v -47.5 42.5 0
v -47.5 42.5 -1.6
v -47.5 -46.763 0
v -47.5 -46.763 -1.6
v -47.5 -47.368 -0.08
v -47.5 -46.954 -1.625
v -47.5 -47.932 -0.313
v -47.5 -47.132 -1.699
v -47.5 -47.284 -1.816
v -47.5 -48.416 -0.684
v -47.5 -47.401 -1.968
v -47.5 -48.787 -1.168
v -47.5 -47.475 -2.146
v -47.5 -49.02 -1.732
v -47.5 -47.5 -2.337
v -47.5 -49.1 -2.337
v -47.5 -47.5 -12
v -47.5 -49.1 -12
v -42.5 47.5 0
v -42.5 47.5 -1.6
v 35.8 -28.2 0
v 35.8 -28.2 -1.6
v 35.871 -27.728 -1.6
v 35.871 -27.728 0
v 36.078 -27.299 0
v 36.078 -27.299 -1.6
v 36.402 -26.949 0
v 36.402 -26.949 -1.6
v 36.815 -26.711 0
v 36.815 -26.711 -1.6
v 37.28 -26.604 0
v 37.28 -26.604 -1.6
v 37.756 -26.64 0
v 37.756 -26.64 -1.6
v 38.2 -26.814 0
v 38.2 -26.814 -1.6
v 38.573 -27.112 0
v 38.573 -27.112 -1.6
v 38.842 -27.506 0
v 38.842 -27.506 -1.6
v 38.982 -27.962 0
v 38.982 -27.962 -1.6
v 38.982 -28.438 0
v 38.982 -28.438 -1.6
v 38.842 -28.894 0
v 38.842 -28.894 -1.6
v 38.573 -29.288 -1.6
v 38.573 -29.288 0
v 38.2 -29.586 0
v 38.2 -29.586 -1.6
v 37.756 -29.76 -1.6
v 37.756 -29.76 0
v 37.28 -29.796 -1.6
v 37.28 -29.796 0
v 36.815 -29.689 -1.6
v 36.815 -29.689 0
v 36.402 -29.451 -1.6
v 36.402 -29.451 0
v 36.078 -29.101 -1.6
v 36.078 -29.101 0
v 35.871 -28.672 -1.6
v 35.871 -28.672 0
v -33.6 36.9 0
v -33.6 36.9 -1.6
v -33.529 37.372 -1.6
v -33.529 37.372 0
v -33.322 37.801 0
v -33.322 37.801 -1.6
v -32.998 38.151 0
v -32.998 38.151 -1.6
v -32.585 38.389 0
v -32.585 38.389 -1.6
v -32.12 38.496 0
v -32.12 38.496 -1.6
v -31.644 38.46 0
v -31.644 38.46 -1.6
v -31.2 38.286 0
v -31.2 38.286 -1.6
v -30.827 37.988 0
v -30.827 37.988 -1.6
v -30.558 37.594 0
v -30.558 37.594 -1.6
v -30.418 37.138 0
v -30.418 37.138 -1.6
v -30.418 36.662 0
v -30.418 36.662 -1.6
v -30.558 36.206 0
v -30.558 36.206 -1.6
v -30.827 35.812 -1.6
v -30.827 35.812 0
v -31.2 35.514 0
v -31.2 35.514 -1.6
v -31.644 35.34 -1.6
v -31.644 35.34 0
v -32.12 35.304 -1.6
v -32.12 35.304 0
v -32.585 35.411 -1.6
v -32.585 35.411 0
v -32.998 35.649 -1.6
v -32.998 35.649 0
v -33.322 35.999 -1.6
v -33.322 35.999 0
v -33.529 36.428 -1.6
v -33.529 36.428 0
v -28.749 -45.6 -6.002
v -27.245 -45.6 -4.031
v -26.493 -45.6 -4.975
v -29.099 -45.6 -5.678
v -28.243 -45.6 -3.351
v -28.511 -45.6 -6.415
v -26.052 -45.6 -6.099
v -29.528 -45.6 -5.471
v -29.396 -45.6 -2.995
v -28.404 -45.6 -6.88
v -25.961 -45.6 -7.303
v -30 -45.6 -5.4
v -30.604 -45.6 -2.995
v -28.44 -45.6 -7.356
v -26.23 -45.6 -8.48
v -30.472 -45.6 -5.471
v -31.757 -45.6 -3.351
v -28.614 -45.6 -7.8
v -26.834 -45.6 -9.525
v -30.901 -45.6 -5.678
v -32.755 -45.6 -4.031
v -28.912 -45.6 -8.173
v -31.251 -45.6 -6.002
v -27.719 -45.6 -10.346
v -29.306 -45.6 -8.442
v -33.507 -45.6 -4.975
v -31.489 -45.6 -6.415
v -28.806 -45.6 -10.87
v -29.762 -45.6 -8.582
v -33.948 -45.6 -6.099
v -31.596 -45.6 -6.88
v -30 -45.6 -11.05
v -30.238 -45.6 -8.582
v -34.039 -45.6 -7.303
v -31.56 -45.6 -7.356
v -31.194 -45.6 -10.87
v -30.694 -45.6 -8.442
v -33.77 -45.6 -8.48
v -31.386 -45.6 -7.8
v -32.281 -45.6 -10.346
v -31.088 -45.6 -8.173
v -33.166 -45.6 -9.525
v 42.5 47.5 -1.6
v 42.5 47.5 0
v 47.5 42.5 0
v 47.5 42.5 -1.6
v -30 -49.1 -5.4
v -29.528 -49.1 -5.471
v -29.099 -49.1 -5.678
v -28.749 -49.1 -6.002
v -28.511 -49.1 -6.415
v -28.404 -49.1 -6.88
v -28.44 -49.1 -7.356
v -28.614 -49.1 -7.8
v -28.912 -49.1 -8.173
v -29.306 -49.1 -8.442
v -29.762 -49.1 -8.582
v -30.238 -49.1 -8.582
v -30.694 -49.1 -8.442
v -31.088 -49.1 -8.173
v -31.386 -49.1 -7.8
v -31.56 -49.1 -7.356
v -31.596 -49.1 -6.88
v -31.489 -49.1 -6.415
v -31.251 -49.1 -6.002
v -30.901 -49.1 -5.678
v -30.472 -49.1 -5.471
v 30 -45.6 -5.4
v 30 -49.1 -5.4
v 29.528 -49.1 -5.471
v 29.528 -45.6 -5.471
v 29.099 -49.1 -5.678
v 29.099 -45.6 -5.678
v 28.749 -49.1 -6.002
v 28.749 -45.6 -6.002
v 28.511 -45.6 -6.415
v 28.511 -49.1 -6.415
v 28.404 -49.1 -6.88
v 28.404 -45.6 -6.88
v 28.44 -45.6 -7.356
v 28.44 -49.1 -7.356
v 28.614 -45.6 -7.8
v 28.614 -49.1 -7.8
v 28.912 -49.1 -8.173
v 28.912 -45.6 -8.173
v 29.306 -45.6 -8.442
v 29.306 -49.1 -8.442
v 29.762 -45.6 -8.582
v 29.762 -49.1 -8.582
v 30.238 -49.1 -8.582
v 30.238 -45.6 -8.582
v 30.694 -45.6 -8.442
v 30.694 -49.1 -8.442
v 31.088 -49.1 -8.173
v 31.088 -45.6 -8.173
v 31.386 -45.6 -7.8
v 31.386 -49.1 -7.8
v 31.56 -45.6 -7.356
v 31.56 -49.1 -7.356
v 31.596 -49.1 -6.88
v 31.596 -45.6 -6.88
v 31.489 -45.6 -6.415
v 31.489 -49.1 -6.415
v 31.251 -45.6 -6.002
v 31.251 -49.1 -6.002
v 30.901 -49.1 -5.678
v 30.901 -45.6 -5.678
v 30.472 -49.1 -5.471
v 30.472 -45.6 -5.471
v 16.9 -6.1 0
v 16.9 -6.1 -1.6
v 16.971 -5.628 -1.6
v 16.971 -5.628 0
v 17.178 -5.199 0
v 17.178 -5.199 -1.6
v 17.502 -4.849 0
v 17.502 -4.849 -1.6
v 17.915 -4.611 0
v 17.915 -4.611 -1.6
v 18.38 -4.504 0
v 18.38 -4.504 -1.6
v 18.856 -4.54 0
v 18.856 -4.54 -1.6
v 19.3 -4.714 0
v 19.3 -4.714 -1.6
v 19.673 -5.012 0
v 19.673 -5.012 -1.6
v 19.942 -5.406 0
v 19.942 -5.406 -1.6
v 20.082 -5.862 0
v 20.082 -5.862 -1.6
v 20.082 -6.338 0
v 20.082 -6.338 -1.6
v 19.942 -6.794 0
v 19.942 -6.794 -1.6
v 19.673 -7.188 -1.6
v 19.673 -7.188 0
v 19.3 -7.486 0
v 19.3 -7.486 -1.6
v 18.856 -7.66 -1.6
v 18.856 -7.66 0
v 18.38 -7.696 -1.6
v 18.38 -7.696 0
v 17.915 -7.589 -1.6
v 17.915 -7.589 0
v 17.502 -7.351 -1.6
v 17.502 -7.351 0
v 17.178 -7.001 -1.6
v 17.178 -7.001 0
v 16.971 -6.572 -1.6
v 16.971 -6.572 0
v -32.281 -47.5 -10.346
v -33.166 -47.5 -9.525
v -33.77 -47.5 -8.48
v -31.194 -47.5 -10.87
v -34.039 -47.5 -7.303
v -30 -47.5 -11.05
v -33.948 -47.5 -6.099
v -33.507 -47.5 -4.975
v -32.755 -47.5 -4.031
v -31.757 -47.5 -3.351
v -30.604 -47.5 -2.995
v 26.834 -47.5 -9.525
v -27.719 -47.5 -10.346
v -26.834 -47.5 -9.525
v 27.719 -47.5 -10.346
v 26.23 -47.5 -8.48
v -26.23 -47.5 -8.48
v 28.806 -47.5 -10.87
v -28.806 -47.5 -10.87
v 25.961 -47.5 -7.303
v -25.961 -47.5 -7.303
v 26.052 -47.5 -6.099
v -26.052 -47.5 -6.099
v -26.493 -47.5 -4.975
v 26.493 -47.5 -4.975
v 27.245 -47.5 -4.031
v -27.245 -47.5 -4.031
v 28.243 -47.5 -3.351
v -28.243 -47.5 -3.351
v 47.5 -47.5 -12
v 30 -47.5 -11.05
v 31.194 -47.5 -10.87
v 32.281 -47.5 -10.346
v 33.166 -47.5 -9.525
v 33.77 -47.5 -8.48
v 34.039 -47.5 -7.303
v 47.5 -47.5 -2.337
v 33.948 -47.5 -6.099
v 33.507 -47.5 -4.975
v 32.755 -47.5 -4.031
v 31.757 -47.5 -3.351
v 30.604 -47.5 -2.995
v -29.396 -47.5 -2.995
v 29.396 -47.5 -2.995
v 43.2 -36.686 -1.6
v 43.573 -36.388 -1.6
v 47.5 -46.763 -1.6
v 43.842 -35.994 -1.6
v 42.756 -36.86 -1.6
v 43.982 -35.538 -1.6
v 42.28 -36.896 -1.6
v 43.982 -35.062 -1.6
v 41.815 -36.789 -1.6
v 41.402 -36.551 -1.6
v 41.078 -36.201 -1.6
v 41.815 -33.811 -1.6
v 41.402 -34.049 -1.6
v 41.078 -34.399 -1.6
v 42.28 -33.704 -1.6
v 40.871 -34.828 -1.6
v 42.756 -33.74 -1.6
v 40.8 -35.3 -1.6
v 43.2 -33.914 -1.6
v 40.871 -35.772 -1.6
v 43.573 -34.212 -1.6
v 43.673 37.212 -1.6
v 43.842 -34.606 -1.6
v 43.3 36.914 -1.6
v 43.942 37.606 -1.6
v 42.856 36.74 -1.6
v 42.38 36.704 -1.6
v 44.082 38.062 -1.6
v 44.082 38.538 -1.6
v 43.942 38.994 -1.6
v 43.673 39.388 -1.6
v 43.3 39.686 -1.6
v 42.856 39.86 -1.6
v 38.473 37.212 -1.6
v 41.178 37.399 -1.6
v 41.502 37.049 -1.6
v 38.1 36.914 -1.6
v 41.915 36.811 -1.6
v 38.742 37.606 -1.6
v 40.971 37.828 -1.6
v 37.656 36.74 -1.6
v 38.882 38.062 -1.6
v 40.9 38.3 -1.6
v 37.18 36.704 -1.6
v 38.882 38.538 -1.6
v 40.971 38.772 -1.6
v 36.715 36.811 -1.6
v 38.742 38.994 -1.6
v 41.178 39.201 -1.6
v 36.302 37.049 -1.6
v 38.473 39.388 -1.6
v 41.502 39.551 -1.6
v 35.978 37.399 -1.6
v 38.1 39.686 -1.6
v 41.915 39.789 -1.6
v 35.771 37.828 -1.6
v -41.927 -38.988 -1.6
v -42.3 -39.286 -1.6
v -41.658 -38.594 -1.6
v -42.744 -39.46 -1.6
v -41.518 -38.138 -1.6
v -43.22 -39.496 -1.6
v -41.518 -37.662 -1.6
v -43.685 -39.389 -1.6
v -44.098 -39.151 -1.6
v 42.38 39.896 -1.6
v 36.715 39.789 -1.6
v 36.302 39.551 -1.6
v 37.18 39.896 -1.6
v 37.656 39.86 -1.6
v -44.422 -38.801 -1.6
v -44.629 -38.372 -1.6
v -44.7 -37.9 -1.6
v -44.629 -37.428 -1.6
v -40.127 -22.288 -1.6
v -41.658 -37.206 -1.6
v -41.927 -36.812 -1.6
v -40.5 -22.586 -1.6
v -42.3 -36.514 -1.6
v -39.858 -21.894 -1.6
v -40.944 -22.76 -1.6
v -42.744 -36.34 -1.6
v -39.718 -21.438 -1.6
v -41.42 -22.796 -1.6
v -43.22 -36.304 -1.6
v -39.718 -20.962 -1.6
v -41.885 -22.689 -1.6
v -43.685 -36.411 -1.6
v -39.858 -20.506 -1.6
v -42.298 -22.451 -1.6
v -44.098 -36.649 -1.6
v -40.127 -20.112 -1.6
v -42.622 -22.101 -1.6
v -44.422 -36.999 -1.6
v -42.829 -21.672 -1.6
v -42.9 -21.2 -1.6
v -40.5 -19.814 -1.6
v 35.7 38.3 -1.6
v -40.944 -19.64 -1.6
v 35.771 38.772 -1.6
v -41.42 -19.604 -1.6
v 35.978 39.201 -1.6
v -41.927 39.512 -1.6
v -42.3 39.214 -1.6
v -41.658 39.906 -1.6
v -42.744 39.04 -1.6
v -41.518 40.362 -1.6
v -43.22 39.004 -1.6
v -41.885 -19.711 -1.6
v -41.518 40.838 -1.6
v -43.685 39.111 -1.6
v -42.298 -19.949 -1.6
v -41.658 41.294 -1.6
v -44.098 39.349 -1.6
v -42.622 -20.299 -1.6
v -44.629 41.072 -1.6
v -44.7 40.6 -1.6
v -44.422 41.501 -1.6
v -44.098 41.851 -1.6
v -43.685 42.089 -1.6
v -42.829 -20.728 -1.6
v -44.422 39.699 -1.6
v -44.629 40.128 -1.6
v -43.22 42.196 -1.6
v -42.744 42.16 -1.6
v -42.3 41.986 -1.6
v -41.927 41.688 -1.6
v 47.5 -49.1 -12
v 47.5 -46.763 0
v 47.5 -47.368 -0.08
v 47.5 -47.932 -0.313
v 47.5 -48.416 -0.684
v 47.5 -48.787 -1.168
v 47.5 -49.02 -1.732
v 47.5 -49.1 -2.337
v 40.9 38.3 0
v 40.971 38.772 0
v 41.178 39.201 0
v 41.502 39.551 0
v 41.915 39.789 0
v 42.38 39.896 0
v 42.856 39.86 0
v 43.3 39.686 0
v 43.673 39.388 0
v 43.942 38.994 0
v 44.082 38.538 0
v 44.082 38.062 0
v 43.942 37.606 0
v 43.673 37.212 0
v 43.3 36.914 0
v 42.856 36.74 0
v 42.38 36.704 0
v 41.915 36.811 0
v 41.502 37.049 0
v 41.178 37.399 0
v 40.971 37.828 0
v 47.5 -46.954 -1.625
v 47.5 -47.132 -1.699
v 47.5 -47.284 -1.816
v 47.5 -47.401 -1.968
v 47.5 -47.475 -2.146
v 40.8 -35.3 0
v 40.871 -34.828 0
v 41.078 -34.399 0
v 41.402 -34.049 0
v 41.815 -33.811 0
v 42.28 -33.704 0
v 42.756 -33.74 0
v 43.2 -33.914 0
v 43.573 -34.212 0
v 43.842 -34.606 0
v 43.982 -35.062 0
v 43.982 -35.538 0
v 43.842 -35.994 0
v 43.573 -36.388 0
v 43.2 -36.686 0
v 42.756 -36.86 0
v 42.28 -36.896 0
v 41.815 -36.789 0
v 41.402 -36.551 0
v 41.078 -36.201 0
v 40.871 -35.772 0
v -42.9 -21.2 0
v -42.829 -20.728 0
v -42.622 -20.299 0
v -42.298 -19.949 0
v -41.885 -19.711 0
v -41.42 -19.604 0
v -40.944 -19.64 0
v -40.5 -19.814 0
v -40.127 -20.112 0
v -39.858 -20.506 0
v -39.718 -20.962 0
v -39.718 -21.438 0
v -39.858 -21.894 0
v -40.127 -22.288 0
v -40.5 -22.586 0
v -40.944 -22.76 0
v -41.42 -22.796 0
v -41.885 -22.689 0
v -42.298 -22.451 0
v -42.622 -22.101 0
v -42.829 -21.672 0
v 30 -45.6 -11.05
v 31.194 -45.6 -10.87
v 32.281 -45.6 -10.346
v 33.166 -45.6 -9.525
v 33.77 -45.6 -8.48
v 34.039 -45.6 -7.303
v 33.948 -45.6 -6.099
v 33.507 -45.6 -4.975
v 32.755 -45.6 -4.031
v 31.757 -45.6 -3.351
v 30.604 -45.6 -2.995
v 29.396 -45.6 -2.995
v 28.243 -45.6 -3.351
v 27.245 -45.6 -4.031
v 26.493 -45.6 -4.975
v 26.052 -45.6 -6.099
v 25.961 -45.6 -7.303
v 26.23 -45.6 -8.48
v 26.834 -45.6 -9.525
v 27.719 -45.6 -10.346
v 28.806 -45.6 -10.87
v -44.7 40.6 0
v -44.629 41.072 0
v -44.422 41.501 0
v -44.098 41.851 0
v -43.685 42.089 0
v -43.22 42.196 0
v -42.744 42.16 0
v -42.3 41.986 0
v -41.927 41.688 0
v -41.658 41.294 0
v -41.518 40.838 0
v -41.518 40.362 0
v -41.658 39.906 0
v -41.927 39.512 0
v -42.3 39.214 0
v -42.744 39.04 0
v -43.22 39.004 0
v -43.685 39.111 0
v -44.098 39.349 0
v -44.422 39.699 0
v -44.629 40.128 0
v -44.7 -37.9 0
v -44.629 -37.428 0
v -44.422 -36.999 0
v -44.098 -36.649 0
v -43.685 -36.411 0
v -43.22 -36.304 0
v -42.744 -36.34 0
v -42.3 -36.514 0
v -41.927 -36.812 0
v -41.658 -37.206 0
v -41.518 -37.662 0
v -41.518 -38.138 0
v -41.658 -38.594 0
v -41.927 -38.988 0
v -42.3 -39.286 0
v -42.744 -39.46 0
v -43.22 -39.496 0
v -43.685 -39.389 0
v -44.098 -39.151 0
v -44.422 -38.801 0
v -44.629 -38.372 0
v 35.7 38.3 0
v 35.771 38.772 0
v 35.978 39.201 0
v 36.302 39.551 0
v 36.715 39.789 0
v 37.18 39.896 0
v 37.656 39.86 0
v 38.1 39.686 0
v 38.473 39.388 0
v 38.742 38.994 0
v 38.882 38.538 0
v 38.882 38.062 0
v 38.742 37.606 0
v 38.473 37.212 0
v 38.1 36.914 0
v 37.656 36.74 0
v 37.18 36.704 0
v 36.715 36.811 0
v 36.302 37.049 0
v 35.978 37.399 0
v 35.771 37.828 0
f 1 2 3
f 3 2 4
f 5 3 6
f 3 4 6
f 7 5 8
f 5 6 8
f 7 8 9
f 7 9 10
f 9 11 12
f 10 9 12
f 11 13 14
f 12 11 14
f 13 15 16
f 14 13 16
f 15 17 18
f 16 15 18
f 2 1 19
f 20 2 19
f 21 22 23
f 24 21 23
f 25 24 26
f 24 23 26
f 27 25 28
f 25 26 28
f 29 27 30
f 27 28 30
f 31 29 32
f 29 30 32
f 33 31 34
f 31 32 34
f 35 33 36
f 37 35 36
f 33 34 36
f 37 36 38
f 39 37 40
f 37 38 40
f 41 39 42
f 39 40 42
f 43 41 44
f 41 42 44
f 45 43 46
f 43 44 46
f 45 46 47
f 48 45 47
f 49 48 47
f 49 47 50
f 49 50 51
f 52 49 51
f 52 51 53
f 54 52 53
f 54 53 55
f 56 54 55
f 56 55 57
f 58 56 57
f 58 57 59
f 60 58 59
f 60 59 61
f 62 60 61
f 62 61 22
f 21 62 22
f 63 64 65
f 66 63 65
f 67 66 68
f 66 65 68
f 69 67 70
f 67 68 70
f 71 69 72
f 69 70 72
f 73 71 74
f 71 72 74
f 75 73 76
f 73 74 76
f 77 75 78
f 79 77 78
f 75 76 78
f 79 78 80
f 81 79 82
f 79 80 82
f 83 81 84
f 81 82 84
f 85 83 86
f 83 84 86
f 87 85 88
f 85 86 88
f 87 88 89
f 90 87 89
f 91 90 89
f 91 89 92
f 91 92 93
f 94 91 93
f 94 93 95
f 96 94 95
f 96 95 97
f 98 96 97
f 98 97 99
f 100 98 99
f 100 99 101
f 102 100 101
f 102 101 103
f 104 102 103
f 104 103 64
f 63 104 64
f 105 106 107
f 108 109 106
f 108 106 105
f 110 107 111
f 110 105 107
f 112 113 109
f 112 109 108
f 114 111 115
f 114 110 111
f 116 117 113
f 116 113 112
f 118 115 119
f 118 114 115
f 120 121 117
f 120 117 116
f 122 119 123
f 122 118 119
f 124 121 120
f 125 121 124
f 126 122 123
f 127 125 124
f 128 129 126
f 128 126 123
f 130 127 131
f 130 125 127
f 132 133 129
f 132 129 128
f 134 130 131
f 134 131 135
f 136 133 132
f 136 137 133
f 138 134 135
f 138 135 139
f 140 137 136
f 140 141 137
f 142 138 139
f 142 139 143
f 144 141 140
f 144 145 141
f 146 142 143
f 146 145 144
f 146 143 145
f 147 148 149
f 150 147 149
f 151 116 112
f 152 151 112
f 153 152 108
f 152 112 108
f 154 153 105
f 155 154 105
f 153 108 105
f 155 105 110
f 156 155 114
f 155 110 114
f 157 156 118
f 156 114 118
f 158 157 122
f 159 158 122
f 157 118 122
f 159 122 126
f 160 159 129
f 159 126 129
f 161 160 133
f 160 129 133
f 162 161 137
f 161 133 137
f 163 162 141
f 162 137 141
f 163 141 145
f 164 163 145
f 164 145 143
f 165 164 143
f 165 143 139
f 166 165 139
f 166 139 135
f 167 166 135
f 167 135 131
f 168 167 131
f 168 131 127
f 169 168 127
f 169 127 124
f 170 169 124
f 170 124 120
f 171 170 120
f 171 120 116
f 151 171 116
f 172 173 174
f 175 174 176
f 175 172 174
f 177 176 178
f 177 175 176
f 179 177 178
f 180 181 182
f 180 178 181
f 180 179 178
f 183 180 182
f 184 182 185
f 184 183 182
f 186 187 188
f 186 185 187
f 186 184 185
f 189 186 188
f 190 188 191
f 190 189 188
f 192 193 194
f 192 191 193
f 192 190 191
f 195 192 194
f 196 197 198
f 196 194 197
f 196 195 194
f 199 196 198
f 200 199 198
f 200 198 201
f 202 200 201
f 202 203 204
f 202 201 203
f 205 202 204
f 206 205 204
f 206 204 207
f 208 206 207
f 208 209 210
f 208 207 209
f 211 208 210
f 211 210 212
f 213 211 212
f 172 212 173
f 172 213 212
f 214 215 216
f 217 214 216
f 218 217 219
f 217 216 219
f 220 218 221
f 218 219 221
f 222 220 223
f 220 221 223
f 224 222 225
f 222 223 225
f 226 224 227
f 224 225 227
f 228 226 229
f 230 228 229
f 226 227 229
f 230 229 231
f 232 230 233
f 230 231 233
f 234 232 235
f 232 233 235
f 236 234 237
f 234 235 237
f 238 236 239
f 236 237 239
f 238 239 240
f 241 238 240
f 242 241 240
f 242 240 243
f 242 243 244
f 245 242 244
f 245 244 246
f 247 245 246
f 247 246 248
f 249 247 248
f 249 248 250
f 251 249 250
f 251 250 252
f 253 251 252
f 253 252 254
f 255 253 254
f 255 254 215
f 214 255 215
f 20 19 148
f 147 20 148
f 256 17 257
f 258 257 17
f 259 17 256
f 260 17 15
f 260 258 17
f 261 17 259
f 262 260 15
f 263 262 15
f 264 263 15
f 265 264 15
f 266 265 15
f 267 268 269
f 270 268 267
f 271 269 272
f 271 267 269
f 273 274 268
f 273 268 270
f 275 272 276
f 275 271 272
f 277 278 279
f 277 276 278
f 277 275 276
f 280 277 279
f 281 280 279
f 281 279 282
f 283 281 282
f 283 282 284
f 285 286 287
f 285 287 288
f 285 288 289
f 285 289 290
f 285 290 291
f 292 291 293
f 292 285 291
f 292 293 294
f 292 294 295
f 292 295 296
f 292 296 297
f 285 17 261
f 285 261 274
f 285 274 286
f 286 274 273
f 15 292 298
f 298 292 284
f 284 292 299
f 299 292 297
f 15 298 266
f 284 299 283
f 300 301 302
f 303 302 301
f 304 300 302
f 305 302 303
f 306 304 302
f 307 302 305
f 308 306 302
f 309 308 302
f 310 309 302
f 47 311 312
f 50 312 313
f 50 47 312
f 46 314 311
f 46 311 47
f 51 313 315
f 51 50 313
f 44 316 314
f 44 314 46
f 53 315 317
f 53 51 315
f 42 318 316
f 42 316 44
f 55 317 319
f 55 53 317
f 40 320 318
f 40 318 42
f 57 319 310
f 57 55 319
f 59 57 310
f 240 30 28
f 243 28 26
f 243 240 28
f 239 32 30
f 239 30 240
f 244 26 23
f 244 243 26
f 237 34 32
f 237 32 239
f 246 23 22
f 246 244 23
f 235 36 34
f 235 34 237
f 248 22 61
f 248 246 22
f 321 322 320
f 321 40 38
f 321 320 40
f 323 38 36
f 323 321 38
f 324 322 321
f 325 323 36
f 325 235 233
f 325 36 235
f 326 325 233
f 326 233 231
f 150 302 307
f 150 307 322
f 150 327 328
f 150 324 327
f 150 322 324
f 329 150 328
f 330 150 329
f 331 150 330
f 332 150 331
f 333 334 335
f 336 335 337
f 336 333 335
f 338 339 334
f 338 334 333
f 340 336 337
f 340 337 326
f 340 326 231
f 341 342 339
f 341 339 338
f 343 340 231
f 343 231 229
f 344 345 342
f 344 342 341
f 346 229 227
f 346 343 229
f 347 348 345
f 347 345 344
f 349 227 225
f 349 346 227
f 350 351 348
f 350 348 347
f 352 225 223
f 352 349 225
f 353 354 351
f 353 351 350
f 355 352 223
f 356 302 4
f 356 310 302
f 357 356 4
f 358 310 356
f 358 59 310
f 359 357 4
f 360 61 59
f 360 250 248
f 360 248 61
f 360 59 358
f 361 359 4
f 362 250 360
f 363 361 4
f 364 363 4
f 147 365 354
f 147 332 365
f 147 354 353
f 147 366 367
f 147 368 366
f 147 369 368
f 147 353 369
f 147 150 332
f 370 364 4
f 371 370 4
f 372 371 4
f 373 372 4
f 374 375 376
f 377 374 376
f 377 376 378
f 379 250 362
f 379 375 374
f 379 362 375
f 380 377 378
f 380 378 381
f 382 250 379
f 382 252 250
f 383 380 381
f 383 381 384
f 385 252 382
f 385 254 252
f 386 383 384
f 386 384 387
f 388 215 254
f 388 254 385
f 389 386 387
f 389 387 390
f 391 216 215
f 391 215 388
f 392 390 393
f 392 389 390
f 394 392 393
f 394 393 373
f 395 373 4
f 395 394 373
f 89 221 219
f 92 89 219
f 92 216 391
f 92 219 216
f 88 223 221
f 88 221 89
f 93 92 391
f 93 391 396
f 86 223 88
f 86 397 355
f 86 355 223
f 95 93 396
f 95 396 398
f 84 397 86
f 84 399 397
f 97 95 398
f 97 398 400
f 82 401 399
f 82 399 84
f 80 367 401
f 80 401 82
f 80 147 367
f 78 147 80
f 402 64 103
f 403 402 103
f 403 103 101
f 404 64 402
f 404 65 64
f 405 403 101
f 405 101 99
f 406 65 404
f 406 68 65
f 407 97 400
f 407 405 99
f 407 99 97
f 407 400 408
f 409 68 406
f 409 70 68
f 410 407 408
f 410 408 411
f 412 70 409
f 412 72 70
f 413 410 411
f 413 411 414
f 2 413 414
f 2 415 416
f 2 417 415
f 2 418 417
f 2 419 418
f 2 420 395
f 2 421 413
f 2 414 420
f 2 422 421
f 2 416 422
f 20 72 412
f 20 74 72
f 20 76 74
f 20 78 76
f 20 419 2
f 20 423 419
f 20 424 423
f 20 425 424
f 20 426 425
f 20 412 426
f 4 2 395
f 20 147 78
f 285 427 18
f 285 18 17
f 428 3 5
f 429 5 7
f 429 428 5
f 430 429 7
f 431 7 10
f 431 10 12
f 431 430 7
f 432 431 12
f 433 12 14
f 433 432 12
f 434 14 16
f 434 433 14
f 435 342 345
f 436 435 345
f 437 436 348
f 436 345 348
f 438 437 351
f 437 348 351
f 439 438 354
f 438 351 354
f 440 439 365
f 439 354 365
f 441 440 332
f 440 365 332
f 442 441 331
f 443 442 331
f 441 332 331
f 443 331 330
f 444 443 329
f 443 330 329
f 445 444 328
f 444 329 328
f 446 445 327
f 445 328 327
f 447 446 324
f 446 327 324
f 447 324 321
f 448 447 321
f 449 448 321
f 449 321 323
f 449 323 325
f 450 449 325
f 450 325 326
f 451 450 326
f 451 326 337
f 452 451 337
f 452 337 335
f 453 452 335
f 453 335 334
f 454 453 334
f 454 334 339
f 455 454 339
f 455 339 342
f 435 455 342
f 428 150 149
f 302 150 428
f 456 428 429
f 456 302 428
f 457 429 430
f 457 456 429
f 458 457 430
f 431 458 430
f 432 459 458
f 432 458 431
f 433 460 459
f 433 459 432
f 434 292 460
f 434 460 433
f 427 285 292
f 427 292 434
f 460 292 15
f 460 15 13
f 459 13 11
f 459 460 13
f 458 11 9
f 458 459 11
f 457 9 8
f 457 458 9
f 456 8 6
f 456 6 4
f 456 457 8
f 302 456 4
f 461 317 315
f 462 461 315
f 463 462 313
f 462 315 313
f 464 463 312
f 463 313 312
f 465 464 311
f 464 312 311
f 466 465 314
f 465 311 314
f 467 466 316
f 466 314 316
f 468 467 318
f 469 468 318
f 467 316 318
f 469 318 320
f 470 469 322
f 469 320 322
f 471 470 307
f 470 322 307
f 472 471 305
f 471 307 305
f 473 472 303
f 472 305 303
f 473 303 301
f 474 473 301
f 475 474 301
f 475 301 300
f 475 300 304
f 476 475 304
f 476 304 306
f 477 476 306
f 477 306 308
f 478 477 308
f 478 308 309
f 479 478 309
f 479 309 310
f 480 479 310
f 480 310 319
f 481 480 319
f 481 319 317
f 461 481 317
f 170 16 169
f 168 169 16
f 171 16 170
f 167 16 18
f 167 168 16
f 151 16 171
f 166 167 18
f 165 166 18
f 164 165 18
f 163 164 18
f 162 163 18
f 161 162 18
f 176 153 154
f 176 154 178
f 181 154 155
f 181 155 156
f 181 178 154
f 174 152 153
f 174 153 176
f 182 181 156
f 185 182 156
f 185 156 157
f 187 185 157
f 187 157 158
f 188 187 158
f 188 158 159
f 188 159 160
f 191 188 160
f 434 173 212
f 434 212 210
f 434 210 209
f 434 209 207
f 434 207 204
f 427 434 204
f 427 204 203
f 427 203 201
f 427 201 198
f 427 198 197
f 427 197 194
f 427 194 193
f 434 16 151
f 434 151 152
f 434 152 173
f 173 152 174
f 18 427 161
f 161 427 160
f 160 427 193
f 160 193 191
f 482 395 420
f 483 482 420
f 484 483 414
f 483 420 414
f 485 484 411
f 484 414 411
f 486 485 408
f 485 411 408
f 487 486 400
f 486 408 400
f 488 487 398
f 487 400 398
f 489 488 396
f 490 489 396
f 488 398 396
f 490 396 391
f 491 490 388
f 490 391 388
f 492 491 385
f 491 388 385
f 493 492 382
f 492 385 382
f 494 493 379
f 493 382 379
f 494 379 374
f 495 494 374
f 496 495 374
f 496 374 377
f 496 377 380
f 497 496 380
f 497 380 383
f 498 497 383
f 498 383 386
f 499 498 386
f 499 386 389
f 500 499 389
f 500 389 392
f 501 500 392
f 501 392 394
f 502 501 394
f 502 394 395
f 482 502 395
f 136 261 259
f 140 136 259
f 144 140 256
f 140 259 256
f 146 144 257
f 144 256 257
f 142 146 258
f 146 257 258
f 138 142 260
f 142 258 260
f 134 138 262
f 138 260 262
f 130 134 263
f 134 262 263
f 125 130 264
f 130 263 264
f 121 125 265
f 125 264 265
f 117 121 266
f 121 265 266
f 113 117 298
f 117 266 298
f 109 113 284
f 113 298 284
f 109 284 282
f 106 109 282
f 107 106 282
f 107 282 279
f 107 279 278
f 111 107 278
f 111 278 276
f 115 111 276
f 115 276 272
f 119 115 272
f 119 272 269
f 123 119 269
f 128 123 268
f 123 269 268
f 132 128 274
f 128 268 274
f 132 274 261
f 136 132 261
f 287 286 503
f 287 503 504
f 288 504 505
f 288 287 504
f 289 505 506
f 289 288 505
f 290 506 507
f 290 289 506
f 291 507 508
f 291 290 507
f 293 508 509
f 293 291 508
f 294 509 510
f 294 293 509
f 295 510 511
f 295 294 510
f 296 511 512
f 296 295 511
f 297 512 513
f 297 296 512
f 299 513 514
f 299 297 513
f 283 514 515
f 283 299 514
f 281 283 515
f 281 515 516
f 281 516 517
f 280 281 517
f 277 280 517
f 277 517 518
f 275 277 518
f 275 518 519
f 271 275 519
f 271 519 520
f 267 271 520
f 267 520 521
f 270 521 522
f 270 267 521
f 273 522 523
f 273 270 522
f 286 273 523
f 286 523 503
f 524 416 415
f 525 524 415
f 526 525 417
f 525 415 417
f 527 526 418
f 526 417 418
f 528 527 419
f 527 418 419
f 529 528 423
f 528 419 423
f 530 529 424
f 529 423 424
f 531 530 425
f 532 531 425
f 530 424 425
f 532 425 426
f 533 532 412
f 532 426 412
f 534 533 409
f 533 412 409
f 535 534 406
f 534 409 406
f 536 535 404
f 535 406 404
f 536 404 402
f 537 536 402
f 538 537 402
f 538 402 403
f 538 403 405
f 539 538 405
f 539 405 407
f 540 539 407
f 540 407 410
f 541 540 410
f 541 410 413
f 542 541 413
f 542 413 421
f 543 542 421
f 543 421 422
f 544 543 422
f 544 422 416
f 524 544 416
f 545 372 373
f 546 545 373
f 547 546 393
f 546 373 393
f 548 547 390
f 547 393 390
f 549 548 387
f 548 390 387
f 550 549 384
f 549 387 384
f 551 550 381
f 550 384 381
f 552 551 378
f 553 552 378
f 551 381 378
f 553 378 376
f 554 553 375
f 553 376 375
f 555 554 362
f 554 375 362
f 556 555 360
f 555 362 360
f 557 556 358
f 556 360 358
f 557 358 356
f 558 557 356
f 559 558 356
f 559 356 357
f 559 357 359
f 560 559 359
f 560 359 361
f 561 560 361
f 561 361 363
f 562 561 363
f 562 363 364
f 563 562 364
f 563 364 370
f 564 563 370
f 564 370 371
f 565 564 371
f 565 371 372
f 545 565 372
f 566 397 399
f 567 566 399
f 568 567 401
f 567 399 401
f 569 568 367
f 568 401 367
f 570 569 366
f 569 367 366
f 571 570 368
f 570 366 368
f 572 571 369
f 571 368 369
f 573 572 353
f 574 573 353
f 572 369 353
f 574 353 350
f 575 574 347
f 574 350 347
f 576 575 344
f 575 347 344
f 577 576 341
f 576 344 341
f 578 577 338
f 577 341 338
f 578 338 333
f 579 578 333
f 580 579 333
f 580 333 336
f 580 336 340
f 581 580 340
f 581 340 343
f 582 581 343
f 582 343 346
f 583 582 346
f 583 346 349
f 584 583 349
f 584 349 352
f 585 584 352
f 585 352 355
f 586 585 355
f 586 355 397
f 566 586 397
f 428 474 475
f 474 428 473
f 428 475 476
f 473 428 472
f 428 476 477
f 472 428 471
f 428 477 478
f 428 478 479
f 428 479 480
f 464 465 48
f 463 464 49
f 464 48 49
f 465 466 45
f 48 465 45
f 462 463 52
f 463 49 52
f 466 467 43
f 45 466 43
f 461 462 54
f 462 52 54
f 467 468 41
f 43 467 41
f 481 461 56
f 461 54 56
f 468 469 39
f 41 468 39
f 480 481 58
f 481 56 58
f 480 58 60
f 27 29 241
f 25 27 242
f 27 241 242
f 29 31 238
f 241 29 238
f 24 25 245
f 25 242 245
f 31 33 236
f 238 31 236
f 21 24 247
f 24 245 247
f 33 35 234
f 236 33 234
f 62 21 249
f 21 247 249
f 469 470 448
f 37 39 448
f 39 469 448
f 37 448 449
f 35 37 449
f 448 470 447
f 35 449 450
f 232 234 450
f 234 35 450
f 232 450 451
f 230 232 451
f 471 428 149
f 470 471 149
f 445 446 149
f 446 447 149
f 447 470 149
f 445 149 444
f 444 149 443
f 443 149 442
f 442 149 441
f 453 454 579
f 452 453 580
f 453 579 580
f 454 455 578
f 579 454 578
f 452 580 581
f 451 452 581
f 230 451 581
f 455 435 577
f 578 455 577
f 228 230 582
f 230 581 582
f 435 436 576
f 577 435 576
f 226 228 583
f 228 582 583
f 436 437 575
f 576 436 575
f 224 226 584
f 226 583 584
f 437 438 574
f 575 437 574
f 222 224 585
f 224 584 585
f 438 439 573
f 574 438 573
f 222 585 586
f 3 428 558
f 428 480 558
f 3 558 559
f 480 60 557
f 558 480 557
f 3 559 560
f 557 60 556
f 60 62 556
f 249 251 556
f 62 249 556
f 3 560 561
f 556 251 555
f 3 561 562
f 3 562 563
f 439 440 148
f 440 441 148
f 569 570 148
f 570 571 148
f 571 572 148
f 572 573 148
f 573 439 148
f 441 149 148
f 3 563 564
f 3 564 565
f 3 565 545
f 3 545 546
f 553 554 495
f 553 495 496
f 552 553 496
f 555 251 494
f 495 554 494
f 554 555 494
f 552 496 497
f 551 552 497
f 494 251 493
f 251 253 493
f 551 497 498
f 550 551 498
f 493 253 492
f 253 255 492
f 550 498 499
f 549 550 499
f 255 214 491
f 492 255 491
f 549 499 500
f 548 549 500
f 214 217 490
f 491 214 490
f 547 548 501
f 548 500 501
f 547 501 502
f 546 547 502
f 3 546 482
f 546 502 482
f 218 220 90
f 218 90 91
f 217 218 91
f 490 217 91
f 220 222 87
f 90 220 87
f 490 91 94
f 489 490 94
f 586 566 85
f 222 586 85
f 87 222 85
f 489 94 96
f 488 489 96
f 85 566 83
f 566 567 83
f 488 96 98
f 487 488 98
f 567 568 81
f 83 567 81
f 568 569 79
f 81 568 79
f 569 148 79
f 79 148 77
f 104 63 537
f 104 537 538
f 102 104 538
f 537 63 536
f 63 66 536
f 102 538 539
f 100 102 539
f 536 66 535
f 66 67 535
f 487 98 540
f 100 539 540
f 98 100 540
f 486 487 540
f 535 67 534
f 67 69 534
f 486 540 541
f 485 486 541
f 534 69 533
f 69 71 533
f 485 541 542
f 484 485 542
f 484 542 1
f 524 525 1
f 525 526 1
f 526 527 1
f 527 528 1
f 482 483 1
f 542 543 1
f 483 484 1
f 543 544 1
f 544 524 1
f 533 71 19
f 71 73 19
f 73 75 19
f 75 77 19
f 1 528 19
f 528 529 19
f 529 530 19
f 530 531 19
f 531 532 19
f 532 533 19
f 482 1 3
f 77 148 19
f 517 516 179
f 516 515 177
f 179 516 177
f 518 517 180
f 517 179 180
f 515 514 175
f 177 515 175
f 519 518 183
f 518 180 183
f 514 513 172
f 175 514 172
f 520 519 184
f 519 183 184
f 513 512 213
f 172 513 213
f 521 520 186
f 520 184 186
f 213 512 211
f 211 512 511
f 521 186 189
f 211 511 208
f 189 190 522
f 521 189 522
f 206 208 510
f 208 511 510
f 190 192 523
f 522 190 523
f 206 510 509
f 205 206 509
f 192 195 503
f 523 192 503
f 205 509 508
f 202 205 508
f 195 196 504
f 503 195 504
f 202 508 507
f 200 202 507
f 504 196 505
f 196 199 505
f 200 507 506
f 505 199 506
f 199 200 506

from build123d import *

# Parameters (mm, degrees)
SM_BASE_FLANGE_2_DEPTH           = 1.6
SM_EDGE_FLANGE_2_STRIP_W         = 7.8732
SM_EDGE_FLANGE_2_STRIP_H         = 1.6
SM_EDGE_FLANGE_2_STRIP_CUT_DEPTH = 95
SM_EDGE_FLANGE_2_DEPTH           = 95
SKETCH_16_R                      = 4.05
EXTRUDE_1_DEPTH                  = 1.9
SKETCH_17_R                      = 1.6
CUT_EXTRUDE_1_DEPTH              = 106.203897266
SKETCH_18_R                      = 1.6
CUT_EXTRUDE_2_DEPTH              = 70.102966651


# Sheet-metal steps are written as plain solids
with BuildPart() as part:
    # 草图1 → 基体-法兰2 (new body)
    with BuildSketch(Plane.XY):
        Polygon((-47.5, 42.5), (-42.5, 47.5), (42.5, 47.5), (47.5, 42.5), (47.5, -47.5), (-47.5, -47.5), align=None)
    extrude(amount=-SM_BASE_FLANGE_2_DEPTH)

    # 边线-法兰2 strip (across the edge) → 边线-法兰2 strip cut (cut)
    with BuildSketch(Plane(origin=(47.5, -47.5, -1.6), x_dir=(0, 1, 0), z_dir=(-1, 0, 0))):
        with Locations((-3.2, -0.8)):
            Rectangle(SM_EDGE_FLANGE_2_STRIP_W, SM_EDGE_FLANGE_2_STRIP_H)
    extrude(amount=SM_EDGE_FLANGE_2_STRIP_CUT_DEPTH, mode=Mode.SUBTRACT)

    # 边线-法兰2 section (across the edge) → 边线-法兰2 (add)
    with BuildSketch(Plane(origin=(47.5, -47.5, -1.6), x_dir=(0, 1, 0), z_dir=(-1, 0, 0))):
        with BuildLine():
            Line((-1.6, 0.7366), (-1.6, 10.4))
            Line((-1.6, 10.4), (0, 10.4))
            Line((0, 10.4), (0, 0.7366))
            ThreePointArc((0, 0.7366), (0.215745145, 0.215745145), (0.7366, 0))
            Line((0.7366, 0), (0.7366, -1.6))
            ThreePointArc((0.7366, -1.6), (-0.915625705, -0.915625705), (-1.6, 0.7366))
        make_face()
    extrude(amount=SM_EDGE_FLANGE_2_DEPTH)

    # 草图16 → 凸台-拉伸1 (add)
    with BuildSketch(Plane(origin=(0, -47.5, 0), x_dir=(1, 0, 0), z_dir=(0, 1, 0))):
        with Locations(Location((-30, 7, 0), (0, 0, 90))):
            Circle(SKETCH_16_R)
    extrude_1 = extrude(amount=EXTRUDE_1_DEPTH)

    # 草图17 → 切除-拉伸1 (cut, through all)
    with BuildSketch(Plane(origin=(0, -45.6, 0), x_dir=(1, 0, 0), z_dir=(0, 1, 0))):
        with Locations(Location((-30, 7, 0), (0, 0, 270))):
            Circle(SKETCH_17_R)
    cut_extrude_1 = extrude(amount=-CUT_EXTRUDE_1_DEPTH, mode=Mode.SUBTRACT)

    # 镜向1: 凸台-拉伸1, 切除-拉伸1 across plane
    add(extrude_1.mirror(Plane(origin=(0, 0, 0), x_dir=(0, 0, 1), z_dir=(1, 0, 0))))
    add(cut_extrude_1.mirror(Plane(origin=(0, 0, 0), x_dir=(0, 0, 1), z_dir=(1, 0, 0))), mode=Mode.SUBTRACT)

    # 草图18 → 切除-拉伸2 (cut, through all)
    with BuildSketch(Plane(origin=(0, 0, -1.6), x_dir=(-1, 0, 0), z_dir=(0, 0, -1))):
        with Locations((-42.5, 38.3)):
            Circle(SKETCH_18_R)
        with Locations((32, 36.9)):
            Circle(SKETCH_18_R)
        with Locations((43.1, 40.6)):
            Circle(SKETCH_18_R)
        with Locations((-18.5, -6.1)):
            Circle(SKETCH_18_R)
        with Locations((-37.4, -28.2)):
            Circle(SKETCH_18_R)
        with Locations((-42.4, -35.3)):
            Circle(SKETCH_18_R)
        with Locations((41.3, -21.2)):
            Circle(SKETCH_18_R)
        with Locations((43.1, -37.9)):
            Circle(SKETCH_18_R)
        with Locations((-37.3, 38.3)):
            Circle(SKETCH_18_R)
    extrude(amount=-CUT_EXTRUDE_2_DEPTH, mode=Mode.SUBTRACT)


solid = part.part
